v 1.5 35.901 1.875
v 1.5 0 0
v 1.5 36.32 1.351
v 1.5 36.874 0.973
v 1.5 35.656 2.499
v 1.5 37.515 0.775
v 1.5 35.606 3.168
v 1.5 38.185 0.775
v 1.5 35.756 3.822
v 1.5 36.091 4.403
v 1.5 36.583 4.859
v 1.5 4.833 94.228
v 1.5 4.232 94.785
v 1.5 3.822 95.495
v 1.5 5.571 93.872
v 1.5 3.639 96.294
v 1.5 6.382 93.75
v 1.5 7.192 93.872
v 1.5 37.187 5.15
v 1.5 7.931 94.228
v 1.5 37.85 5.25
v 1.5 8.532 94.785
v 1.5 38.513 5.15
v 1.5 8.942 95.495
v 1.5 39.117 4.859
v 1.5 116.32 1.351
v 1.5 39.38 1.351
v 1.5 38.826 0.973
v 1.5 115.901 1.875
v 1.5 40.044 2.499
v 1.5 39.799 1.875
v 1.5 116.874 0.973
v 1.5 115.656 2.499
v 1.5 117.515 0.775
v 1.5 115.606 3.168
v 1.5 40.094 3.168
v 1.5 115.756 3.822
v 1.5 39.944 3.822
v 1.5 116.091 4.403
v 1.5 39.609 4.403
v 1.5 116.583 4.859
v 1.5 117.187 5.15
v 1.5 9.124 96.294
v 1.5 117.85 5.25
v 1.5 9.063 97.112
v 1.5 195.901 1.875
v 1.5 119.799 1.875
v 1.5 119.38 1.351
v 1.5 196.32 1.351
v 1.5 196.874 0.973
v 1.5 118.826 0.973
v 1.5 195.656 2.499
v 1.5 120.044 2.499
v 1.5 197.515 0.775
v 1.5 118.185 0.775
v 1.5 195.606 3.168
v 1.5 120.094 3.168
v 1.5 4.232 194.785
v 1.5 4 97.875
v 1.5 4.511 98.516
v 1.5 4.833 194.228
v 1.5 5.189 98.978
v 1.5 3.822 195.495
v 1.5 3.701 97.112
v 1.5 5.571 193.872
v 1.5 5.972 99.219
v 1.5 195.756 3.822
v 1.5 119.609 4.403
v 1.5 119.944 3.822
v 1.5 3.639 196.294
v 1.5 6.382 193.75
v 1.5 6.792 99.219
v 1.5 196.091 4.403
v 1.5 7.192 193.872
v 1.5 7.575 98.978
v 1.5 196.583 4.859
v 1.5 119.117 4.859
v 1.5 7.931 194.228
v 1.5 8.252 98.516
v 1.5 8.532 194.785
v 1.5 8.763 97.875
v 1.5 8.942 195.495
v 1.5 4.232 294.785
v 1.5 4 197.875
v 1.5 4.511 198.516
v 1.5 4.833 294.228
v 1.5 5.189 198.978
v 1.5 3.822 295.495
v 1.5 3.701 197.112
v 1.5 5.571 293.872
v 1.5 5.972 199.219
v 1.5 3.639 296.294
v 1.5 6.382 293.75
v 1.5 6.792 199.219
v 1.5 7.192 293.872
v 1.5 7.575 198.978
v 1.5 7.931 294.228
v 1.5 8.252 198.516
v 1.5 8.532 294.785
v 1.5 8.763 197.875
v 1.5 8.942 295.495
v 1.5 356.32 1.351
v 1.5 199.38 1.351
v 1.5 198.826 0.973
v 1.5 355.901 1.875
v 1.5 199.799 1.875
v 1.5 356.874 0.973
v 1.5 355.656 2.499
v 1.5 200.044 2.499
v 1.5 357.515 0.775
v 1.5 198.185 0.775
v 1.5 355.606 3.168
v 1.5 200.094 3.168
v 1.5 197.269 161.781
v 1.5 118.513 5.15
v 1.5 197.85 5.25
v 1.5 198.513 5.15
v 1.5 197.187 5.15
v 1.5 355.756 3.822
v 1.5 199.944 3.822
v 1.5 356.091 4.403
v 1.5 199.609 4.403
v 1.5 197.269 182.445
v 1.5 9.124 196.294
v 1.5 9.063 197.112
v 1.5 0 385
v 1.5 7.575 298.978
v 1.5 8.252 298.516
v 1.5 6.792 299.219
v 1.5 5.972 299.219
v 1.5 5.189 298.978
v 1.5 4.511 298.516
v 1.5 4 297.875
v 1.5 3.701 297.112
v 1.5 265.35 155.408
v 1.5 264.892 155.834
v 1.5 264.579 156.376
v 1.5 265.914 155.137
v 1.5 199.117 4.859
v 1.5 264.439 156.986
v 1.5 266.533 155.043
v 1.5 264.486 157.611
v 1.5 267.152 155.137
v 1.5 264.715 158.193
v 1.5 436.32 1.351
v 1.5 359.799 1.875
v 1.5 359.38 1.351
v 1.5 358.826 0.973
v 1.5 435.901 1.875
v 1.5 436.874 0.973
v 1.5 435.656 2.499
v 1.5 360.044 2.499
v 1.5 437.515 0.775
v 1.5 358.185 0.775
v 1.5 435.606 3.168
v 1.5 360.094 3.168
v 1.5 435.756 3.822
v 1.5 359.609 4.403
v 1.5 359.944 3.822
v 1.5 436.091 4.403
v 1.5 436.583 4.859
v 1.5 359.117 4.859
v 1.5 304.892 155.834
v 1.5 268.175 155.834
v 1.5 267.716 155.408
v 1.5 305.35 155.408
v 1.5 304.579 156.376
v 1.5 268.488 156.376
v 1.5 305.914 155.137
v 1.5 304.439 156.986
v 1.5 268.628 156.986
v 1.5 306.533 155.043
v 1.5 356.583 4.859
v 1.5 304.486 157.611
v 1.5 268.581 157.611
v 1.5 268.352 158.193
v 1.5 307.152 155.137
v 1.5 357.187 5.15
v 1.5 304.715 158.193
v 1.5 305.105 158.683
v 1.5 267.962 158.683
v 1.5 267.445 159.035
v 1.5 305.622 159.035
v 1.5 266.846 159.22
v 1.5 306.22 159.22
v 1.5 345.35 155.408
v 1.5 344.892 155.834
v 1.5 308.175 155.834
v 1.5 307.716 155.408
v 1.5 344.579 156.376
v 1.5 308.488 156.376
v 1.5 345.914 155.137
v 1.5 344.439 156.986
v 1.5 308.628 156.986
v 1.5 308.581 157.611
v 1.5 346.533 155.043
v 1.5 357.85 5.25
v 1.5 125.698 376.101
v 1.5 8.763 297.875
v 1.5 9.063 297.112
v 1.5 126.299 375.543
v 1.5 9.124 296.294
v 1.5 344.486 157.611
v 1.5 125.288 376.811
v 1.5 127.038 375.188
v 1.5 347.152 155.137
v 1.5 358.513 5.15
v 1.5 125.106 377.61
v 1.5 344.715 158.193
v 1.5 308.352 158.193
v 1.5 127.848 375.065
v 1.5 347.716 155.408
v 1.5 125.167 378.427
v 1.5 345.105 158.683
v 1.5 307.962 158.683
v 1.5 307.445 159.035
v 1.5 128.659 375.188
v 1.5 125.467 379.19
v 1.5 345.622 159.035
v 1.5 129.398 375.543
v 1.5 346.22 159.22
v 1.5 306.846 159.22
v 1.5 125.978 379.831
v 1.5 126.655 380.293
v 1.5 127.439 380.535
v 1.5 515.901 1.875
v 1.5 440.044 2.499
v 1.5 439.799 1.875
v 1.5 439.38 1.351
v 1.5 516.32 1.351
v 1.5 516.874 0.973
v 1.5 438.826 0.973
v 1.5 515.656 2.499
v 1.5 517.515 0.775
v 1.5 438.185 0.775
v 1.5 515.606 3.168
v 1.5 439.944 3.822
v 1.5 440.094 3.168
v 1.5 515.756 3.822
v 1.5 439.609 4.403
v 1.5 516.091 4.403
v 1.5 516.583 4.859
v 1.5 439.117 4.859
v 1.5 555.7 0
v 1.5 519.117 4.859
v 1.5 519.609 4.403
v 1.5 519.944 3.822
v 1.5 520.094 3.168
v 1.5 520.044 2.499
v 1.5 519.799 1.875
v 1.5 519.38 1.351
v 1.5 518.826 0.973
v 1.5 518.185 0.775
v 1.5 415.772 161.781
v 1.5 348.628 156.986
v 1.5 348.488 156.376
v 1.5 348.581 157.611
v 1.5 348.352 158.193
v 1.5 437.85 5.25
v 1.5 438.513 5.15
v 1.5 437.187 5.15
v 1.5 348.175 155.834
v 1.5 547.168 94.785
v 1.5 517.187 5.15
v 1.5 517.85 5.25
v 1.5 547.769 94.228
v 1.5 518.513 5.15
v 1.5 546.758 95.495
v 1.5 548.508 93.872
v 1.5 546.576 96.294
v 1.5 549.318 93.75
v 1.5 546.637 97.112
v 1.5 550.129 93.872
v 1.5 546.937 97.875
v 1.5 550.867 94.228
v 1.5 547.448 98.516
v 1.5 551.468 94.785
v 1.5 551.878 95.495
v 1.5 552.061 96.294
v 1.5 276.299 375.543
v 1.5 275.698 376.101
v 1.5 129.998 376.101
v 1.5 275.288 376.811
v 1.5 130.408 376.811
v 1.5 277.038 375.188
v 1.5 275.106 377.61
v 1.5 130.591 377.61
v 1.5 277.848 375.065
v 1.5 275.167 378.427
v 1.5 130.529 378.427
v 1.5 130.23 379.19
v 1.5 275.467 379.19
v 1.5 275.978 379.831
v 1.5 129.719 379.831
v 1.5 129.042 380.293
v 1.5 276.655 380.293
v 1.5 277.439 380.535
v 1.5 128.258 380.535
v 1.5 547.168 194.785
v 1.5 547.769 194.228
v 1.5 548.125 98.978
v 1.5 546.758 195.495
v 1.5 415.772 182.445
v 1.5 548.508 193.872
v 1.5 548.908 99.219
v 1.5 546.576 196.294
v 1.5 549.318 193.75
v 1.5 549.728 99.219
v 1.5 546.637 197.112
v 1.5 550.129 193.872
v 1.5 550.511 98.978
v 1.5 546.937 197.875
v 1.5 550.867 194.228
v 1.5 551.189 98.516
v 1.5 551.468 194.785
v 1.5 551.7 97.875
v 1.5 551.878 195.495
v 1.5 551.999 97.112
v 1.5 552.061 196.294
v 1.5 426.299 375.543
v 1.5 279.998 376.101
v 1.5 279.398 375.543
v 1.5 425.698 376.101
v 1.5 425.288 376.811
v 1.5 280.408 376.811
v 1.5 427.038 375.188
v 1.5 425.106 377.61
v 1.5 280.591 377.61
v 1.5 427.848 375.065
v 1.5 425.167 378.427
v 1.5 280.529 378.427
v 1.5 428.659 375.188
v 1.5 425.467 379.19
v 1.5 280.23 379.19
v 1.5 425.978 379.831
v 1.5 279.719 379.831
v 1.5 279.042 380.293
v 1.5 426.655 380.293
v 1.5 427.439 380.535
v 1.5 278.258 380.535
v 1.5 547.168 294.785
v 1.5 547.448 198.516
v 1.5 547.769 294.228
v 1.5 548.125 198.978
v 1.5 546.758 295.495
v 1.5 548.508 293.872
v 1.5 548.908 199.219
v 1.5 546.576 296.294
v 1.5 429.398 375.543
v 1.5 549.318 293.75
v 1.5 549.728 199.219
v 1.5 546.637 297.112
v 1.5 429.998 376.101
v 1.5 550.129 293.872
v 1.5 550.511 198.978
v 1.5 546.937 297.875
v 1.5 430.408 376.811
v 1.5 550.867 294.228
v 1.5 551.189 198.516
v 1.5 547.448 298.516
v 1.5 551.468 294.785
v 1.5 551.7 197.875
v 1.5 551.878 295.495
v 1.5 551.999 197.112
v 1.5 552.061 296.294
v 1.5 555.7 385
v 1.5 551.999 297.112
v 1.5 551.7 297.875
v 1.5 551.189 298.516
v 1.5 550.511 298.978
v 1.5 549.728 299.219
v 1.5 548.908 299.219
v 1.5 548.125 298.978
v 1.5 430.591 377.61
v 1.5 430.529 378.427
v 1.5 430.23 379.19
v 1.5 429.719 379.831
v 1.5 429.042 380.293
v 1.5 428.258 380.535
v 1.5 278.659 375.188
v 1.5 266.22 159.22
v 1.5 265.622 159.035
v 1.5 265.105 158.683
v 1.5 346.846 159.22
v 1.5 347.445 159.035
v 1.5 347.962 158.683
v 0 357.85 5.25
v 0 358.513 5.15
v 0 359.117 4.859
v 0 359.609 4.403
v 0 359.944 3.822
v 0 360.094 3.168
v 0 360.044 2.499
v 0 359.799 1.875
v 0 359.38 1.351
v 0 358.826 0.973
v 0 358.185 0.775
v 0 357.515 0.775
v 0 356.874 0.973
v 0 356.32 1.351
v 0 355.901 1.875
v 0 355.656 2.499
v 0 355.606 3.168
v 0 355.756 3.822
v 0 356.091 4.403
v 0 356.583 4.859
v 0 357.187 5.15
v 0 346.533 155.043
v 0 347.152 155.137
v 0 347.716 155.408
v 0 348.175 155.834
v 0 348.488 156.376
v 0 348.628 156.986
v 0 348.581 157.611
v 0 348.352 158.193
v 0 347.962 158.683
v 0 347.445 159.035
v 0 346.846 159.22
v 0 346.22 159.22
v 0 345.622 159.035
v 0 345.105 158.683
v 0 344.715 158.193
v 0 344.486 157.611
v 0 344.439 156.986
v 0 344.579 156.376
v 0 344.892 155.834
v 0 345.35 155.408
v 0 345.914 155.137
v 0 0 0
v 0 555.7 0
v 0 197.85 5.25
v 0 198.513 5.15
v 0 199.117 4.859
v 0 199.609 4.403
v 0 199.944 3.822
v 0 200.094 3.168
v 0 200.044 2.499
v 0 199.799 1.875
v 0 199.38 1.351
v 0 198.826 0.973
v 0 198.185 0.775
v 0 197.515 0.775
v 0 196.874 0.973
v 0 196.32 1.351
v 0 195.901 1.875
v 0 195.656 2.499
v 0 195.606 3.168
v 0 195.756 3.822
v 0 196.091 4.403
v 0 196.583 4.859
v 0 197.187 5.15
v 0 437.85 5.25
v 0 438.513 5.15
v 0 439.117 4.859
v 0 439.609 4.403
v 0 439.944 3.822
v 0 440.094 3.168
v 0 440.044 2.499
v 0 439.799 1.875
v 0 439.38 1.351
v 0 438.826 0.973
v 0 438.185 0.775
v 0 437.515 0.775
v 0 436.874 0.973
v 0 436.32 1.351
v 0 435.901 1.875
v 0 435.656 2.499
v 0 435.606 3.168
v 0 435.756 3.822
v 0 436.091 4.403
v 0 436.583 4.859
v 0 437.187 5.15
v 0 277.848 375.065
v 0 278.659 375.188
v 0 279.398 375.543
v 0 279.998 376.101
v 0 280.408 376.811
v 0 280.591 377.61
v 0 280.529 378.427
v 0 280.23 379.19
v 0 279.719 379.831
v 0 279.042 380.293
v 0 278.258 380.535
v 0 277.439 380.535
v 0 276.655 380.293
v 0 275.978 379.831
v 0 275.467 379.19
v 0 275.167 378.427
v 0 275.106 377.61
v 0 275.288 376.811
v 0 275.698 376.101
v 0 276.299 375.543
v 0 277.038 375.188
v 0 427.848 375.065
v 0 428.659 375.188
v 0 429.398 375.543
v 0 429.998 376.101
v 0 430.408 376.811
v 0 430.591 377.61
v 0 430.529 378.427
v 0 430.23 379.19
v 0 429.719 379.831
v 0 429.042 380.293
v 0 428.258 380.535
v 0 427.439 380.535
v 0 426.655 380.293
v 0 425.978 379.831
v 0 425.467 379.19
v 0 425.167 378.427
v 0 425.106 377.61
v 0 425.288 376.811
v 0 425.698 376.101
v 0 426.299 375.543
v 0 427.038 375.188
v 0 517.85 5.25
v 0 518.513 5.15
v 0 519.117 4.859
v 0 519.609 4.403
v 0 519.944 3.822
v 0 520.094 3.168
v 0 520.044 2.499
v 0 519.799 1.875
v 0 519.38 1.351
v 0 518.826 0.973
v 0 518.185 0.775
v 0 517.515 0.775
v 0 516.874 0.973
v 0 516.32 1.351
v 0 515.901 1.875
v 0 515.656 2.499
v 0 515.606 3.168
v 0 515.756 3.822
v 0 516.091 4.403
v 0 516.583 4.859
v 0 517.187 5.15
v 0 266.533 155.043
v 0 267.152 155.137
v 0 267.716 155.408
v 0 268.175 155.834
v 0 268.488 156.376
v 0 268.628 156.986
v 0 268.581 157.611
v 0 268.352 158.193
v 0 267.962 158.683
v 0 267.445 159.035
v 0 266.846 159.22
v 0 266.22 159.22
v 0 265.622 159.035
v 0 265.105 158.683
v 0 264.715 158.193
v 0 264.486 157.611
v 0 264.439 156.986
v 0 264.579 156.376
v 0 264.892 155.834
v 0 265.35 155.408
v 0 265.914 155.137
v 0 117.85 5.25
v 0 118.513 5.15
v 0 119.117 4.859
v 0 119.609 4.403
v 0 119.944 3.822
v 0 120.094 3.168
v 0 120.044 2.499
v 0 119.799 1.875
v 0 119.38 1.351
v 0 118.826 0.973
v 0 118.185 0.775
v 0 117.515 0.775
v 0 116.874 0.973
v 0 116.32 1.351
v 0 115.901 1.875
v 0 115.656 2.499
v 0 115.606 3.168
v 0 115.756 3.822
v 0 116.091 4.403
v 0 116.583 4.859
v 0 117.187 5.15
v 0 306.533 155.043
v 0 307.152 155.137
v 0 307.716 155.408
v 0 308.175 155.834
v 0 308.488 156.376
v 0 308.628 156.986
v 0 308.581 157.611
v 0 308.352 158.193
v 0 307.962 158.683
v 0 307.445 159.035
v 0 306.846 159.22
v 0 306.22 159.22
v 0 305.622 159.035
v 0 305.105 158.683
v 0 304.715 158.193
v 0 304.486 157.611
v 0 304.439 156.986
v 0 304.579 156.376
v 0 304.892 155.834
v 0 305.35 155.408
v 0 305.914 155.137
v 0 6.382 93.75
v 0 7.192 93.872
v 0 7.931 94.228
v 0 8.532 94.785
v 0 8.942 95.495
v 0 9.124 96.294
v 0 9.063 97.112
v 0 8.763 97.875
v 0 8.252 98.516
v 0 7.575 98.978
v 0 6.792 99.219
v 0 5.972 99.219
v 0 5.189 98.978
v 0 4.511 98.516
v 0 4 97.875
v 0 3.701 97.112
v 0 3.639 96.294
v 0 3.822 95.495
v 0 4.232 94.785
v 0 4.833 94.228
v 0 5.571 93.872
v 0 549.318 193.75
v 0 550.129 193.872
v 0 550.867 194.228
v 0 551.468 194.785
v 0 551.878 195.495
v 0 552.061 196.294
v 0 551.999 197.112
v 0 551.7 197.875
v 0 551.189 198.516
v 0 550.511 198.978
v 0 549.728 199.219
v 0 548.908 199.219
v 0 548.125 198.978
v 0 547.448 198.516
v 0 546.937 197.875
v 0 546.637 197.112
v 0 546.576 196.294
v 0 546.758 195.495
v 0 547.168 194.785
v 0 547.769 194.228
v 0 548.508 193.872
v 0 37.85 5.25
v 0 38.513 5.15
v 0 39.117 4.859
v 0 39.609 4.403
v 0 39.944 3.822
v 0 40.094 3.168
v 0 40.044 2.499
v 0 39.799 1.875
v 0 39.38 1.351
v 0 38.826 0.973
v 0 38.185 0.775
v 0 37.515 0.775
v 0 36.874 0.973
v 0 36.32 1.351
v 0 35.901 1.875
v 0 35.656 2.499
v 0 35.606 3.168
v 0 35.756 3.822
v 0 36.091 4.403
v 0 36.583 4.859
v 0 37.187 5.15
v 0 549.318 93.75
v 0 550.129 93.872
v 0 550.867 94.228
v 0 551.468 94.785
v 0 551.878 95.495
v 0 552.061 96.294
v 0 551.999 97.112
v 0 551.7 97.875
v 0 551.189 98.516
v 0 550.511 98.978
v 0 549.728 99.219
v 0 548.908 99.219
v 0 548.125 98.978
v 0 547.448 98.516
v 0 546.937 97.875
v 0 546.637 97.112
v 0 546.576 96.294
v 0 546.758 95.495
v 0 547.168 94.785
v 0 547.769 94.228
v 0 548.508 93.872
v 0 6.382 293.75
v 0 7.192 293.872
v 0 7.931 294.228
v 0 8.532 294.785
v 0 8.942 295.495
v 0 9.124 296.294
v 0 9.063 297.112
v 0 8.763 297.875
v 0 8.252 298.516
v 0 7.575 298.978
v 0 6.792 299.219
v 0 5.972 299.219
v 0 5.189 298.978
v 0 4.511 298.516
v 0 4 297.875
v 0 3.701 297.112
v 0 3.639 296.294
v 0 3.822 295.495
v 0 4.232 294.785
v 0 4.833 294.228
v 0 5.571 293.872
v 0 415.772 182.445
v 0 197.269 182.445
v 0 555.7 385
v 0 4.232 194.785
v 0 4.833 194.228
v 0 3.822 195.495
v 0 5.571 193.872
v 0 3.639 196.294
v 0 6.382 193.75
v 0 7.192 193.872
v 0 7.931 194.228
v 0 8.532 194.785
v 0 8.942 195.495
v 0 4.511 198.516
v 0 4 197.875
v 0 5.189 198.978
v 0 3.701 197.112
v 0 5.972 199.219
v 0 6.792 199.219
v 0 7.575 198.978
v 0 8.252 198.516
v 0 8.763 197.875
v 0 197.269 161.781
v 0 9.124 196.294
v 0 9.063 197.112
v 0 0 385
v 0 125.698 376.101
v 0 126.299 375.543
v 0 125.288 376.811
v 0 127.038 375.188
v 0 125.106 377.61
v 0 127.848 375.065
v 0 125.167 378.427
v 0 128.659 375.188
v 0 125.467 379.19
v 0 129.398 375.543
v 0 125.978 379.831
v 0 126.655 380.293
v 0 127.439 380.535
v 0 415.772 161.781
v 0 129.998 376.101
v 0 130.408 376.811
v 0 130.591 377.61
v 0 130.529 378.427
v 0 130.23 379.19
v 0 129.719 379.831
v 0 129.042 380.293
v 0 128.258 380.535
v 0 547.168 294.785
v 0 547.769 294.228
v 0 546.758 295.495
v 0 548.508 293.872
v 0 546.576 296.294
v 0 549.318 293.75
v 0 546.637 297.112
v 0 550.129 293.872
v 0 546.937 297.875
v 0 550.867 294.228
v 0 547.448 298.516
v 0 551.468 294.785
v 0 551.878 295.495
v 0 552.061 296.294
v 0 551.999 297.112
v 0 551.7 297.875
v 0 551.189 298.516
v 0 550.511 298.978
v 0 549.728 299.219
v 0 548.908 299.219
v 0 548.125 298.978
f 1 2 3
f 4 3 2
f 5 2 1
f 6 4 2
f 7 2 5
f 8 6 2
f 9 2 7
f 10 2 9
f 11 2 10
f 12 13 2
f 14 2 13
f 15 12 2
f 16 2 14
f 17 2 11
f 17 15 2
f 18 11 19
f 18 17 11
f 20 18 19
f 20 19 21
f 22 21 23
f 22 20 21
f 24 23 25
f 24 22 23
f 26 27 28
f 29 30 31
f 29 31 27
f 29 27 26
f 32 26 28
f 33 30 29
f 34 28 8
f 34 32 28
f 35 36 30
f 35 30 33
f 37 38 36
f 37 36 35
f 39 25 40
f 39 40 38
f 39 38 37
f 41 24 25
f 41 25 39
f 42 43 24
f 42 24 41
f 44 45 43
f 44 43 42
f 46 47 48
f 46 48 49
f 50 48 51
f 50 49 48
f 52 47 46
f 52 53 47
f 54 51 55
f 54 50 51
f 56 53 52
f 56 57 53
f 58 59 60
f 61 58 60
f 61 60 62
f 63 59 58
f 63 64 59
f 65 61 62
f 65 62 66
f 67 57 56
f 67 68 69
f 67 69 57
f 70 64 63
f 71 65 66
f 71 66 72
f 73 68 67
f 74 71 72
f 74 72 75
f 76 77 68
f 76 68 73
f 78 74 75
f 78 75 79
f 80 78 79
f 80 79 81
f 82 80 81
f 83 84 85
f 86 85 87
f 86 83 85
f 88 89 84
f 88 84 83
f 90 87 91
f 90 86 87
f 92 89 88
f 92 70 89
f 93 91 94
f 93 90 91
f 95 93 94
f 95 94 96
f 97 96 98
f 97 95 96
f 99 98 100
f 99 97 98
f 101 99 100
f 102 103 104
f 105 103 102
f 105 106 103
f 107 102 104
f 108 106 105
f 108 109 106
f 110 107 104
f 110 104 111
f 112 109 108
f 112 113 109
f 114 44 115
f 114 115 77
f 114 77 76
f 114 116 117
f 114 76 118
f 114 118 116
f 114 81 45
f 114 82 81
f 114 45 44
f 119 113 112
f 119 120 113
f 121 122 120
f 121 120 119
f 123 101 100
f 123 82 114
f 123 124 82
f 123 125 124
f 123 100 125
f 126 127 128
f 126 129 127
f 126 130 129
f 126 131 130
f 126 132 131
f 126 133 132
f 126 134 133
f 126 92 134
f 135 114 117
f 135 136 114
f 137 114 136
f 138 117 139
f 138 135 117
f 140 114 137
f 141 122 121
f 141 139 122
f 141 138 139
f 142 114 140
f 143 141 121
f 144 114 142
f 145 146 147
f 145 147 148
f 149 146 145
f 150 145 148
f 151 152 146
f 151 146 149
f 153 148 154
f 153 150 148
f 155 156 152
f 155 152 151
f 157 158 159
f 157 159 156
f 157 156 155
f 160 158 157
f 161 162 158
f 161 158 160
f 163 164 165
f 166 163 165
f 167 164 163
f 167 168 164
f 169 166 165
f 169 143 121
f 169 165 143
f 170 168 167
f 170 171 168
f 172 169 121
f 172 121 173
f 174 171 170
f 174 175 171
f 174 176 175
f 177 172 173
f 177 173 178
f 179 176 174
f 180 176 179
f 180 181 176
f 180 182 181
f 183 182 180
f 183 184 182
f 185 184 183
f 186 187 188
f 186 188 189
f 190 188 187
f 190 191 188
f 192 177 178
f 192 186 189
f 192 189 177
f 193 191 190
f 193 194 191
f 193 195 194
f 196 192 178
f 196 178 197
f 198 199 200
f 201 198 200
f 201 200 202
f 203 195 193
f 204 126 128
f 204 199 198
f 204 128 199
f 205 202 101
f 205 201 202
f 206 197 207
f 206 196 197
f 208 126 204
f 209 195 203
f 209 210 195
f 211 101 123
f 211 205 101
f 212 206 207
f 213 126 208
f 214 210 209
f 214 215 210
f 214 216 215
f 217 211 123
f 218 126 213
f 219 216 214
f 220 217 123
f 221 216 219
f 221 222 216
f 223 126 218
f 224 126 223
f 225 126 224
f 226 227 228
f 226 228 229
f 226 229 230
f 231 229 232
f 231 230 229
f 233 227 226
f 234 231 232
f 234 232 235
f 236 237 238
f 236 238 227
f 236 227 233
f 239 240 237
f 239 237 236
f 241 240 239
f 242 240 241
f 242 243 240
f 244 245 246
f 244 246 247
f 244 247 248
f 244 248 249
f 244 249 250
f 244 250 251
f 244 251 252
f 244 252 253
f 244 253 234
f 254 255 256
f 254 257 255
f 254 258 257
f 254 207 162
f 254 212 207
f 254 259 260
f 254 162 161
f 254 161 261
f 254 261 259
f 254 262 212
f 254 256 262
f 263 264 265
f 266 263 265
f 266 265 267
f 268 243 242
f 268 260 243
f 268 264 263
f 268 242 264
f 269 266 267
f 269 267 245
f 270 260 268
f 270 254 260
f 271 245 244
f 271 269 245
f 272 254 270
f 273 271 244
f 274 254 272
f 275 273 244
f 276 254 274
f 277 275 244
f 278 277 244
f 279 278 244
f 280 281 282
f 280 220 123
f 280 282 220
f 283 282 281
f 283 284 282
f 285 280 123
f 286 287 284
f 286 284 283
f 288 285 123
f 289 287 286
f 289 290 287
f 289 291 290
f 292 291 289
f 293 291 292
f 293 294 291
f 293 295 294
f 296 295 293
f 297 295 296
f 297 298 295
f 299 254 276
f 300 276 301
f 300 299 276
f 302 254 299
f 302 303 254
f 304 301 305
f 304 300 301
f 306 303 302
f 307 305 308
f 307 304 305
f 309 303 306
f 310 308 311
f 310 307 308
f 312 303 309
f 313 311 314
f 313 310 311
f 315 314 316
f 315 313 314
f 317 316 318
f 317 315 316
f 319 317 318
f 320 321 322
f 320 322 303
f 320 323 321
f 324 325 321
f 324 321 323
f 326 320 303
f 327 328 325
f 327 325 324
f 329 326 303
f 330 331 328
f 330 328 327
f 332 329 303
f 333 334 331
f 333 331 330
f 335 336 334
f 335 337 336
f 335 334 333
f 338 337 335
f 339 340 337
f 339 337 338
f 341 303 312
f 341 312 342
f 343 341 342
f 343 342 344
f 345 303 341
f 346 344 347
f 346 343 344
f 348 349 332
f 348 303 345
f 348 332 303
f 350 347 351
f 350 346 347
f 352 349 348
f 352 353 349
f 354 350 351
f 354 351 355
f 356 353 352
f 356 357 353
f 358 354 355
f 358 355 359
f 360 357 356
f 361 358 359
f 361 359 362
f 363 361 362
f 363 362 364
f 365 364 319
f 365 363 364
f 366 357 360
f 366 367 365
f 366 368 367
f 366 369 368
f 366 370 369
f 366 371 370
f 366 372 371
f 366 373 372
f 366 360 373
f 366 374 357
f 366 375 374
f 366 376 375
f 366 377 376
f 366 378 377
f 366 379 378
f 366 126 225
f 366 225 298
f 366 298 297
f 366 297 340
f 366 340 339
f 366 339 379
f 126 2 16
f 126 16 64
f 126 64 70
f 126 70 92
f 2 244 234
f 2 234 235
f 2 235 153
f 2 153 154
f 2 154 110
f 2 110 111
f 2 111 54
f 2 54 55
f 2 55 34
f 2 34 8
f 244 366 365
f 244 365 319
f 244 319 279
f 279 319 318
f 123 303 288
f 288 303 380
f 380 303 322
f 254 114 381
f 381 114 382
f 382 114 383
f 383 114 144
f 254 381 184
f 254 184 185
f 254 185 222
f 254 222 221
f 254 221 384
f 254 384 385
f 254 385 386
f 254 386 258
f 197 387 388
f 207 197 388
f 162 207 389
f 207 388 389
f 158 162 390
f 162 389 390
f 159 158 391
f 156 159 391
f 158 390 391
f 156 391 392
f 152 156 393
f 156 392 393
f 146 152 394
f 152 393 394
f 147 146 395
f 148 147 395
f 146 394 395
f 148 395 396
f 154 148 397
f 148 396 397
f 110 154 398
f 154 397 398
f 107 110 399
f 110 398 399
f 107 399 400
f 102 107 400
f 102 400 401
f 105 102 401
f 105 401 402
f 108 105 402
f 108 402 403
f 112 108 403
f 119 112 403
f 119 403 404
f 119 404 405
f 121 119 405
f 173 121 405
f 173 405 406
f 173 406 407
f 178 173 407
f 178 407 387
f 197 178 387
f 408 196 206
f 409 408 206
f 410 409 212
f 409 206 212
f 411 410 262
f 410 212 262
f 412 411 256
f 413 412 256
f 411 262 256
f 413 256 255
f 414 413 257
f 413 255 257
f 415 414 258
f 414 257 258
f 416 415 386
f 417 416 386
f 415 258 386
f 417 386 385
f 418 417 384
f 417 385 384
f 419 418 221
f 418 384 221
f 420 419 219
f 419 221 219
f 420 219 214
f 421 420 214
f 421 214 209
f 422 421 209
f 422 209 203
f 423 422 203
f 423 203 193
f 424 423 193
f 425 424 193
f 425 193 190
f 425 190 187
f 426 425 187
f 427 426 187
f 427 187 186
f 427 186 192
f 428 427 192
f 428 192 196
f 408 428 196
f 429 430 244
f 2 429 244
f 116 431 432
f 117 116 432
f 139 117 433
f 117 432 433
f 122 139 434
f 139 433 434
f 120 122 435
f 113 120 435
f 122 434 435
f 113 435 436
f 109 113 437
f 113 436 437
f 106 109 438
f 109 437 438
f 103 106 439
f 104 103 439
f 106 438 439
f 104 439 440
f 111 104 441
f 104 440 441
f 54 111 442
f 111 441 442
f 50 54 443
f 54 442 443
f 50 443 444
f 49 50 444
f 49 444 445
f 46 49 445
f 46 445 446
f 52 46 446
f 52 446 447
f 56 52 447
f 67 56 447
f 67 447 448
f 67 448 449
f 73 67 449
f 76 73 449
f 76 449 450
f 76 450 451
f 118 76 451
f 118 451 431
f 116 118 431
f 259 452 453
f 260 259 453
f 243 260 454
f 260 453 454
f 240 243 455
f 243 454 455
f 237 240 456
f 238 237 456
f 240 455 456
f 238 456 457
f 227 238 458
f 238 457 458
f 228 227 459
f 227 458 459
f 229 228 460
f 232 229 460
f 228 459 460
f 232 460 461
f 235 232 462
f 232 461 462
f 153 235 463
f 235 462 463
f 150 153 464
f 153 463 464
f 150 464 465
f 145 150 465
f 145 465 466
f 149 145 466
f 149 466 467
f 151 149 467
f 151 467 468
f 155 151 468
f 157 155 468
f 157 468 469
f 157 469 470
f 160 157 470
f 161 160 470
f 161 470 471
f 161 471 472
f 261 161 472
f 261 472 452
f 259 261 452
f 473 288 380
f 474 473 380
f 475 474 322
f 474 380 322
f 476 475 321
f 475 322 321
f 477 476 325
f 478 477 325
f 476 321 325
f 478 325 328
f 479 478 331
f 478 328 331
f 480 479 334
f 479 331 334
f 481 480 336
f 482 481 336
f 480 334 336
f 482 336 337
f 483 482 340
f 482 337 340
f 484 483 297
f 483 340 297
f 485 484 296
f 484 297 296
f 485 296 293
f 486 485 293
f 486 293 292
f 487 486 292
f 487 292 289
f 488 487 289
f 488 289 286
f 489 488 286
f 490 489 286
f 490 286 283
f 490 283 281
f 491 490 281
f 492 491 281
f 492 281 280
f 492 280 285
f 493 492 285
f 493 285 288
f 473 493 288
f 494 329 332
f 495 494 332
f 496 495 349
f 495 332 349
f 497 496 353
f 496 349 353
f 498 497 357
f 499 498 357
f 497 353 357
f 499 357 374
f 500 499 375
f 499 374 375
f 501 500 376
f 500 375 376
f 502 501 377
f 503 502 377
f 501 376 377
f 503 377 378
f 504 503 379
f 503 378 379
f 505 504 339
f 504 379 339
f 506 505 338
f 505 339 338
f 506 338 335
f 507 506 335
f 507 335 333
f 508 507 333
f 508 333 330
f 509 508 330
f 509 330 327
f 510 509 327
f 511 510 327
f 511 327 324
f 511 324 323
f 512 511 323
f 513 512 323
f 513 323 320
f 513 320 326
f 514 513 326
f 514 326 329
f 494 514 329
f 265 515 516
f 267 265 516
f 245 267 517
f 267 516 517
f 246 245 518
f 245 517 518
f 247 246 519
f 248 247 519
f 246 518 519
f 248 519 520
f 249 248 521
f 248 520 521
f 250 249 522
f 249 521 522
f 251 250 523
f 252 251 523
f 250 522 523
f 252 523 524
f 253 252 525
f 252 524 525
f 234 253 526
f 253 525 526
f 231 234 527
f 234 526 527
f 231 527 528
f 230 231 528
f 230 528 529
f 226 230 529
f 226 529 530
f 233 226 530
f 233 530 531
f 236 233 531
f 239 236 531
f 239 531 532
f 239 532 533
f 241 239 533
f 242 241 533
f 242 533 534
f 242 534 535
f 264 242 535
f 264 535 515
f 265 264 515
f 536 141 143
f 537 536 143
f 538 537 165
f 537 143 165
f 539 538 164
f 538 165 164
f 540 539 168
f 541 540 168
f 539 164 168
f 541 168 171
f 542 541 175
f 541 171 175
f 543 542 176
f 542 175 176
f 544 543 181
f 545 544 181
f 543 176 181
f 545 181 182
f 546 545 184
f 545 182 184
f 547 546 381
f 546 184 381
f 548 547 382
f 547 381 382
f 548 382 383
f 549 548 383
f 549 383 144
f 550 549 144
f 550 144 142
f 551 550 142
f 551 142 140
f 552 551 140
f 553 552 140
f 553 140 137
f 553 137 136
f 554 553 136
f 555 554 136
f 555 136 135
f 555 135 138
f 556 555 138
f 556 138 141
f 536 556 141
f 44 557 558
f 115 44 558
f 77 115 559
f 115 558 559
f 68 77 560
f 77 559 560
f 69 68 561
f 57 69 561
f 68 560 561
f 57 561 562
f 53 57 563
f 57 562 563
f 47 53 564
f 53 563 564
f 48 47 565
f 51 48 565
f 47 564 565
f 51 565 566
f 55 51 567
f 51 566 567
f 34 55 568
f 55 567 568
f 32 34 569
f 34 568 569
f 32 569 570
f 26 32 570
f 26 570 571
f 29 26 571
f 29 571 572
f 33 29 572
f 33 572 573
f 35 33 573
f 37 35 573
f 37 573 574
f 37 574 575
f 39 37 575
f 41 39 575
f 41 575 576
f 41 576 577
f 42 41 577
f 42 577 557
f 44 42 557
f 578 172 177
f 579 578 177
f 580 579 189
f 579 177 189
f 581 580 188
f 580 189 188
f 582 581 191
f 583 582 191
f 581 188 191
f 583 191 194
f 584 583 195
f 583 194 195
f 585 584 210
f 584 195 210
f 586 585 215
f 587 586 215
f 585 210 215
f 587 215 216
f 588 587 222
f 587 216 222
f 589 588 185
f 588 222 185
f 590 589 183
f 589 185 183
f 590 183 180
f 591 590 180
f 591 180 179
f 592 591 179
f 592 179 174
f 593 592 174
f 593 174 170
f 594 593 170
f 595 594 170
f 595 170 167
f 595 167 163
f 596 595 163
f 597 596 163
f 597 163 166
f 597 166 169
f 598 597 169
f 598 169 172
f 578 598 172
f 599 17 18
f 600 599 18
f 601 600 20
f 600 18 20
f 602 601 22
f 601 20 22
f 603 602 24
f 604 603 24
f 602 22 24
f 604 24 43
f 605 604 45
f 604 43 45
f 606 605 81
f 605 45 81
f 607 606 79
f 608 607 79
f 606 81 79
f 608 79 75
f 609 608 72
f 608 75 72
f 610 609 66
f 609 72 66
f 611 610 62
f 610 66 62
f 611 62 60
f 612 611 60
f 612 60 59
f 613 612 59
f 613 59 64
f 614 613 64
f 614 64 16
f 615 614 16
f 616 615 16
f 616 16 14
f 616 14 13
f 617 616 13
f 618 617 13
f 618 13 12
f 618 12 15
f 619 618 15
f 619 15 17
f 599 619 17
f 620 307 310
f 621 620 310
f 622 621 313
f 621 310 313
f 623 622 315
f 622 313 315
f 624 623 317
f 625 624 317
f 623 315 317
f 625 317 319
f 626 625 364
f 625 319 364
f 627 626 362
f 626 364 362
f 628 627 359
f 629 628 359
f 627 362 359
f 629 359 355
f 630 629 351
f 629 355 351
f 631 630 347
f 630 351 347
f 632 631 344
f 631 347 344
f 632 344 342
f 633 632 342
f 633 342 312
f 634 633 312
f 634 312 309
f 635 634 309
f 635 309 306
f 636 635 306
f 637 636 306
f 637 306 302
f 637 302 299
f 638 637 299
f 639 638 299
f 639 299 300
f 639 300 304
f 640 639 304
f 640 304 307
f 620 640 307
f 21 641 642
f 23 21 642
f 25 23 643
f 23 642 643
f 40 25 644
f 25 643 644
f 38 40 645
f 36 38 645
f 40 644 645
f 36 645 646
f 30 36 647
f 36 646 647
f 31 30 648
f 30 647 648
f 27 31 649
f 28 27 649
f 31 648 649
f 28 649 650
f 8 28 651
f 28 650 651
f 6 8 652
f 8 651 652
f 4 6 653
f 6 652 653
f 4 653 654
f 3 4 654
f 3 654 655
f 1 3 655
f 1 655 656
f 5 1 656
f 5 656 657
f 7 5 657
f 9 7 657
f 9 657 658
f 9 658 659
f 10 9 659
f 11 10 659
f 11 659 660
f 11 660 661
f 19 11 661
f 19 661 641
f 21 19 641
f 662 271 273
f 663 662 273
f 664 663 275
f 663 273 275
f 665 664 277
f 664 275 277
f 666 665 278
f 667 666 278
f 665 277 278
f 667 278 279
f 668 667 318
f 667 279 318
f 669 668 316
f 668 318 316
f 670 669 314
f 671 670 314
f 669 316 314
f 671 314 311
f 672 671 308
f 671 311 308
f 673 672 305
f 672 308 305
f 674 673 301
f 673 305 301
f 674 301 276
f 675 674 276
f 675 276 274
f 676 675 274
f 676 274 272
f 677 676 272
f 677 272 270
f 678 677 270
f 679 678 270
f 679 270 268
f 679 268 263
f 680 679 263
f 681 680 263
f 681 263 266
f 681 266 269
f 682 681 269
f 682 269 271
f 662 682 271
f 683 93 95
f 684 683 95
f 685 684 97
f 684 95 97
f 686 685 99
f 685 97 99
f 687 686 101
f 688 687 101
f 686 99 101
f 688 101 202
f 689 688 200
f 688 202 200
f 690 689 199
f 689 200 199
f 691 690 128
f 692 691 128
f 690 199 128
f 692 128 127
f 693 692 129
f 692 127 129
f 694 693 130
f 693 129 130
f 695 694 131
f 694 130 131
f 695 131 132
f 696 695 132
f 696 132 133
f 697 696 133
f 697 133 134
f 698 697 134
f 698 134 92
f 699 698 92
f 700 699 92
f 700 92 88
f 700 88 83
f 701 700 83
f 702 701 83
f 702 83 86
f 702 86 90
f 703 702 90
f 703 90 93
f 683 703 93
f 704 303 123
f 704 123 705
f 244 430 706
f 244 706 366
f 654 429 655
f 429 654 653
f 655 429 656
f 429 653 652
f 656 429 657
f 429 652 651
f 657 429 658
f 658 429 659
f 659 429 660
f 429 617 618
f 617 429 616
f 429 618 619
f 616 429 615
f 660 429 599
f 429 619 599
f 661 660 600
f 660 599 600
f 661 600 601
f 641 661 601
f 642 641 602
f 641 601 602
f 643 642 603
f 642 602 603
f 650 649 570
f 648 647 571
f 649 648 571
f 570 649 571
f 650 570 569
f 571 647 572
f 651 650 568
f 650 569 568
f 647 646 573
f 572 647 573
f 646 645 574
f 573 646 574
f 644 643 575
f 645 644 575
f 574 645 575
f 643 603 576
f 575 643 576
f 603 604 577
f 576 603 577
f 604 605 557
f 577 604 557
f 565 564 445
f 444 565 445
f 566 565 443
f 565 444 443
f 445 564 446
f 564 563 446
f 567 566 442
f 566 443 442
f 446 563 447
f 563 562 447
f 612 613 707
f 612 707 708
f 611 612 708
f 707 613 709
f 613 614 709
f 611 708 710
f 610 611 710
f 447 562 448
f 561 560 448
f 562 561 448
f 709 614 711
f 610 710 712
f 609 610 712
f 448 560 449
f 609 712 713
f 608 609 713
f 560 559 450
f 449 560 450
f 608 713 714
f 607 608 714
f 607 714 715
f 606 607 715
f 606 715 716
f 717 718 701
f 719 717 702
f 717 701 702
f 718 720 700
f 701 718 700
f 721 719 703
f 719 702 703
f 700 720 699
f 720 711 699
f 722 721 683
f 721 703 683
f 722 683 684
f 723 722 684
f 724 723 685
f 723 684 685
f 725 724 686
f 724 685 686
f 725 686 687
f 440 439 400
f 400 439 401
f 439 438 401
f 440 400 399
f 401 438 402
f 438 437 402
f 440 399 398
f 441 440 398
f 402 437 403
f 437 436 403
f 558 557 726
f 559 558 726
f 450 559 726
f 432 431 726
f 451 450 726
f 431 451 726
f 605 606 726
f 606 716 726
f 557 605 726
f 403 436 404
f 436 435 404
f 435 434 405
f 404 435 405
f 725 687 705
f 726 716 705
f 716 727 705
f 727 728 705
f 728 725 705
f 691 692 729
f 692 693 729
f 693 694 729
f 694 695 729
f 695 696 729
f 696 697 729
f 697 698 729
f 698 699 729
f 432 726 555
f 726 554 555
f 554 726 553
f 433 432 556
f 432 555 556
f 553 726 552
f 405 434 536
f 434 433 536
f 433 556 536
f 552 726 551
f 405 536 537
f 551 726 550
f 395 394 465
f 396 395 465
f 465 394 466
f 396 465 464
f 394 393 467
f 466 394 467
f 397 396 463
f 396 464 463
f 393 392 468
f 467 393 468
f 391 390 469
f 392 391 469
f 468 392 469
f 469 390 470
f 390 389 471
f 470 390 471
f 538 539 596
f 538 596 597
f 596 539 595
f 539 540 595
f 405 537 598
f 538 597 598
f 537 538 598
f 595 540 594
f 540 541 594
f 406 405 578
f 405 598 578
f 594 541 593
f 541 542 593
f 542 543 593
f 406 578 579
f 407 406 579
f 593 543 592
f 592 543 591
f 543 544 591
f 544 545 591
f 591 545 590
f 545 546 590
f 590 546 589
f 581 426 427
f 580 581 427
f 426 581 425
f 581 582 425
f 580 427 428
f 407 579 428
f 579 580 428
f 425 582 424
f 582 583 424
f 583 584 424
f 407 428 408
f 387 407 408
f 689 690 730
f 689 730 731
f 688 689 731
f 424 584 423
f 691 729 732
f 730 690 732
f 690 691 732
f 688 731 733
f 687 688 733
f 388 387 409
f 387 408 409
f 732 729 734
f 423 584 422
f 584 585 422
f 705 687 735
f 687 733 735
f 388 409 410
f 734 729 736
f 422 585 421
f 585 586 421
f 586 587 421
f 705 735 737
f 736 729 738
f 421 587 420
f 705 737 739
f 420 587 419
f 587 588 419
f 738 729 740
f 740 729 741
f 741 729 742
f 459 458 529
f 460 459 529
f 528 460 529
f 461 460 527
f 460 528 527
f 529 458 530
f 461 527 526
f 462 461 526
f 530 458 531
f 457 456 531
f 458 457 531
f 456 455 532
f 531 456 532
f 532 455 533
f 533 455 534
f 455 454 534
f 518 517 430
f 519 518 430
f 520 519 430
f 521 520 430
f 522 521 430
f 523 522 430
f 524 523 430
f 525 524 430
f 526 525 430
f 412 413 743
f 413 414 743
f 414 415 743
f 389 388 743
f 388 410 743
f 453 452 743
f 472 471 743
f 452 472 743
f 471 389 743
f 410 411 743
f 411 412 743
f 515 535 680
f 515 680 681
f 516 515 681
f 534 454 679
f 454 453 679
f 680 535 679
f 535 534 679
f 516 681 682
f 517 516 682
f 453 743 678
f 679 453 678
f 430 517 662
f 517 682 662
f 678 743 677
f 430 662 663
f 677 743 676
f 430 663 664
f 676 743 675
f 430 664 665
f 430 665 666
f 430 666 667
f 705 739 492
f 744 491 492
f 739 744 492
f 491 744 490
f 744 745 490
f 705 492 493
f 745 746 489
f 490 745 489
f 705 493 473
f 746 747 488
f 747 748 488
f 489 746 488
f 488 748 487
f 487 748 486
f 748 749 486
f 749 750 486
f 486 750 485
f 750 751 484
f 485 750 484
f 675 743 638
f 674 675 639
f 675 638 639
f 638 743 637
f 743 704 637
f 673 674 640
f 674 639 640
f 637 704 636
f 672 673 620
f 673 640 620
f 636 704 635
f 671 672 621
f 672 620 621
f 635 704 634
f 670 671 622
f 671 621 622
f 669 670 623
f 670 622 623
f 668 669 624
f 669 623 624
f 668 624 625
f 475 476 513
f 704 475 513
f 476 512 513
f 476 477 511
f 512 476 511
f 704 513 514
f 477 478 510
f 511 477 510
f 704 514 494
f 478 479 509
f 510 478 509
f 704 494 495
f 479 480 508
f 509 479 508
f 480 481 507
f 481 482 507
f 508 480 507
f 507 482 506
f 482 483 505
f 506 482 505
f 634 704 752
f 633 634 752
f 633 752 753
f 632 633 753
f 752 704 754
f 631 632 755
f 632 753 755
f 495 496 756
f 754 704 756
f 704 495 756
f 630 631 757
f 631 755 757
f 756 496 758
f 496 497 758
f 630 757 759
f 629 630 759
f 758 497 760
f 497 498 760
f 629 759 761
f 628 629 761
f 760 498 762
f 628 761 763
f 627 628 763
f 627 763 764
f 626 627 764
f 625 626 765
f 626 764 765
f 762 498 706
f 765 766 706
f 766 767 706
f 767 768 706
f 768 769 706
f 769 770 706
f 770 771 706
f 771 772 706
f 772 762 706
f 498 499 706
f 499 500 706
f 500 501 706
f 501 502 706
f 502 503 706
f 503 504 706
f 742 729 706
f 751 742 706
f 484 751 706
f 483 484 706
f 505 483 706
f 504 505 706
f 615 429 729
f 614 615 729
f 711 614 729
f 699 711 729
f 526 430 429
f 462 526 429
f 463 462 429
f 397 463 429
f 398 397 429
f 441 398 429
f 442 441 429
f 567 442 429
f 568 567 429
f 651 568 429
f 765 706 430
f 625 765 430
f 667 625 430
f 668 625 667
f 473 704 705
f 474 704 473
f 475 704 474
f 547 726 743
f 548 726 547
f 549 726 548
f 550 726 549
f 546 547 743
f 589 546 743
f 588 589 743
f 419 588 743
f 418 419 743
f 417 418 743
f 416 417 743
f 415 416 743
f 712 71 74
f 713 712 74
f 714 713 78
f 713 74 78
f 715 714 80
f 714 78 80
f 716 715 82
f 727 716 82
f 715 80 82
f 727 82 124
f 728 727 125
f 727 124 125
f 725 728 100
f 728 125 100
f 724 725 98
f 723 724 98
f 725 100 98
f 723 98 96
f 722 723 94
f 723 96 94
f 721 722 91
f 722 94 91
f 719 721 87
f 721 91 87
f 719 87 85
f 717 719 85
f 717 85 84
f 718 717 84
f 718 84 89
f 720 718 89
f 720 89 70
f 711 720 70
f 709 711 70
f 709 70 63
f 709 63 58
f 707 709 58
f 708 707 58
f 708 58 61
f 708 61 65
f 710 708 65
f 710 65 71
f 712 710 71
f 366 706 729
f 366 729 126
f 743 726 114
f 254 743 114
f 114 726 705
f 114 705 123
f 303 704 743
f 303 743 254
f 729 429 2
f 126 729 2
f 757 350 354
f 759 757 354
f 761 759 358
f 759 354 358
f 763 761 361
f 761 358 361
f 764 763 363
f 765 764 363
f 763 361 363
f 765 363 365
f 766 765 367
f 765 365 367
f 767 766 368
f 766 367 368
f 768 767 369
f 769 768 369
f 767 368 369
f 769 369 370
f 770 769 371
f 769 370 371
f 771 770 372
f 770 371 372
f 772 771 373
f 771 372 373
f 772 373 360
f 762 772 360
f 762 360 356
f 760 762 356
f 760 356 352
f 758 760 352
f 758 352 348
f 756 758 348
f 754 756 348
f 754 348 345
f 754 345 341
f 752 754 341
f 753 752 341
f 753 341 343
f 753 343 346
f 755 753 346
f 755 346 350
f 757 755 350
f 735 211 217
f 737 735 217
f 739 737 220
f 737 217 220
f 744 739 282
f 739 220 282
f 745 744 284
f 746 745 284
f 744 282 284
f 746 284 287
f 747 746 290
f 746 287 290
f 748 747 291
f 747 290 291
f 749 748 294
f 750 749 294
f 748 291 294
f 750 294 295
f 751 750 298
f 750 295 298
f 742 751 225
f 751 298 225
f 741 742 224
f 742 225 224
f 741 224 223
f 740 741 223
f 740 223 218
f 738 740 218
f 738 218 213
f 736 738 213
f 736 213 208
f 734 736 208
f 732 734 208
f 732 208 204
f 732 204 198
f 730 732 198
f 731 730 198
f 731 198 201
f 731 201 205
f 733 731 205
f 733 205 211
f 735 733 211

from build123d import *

# Parameters (mm, degrees)
SKETCH_1_W             = 1.5
SKETCH_1_H             = 555.7
SM_BASE_FLANGE_1_DEPTH = 385
SKETCH_6_W             = 88.363212941
SKETCH_6_H             = 264.50252719
CUT_EXTRUDE_1_DEPTH    = 74.5
SKETCH_7_W             = 1.5
SKETCH_7_H             = 264.50252719
EXTRUDE_1_DEPTH        = 47.7
SKETCH_8_W             = 1.5
SKETCH_8_H             = 40.663212941
EXTRUDE_2_DEPTH        = 20
SKETCH_9_W             = 1.5
SKETCH_9_H             = 40.663212941
EXTRUDE_3_DEPTH        = 26
SKETCH_10_W            = 1.5
SKETCH_10_H            = 218.50252719
EXTRUDE_4_DEPTH        = 20
SKETCH_12_R            = 2.75
CUT_EXTRUDE_2_DEPTH    = 20
SKETCH_13_R            = 2.75
CUT_EXTRUDE_3_DEPTH    = 10
SKETCH_14_R            = 2.75
CUT_EXTRUDE_4_DEPTH    = 10
SKETCH_15_R            = 2.25
CUT_EXTRUDE_5_DEPTH    = 10
SKETCH_17_R            = 2.1
CUT_EXTRUDE_6_DEPTH    = 20


# Sheet-metal steps are written as plain solids
with BuildPart() as part:
    # Sketch 1 → 基体-法兰1 (new body)
    with BuildSketch(Plane.XY):
        with Locations((0.75, 277.85)):
            Rectangle(SKETCH_1_W, SKETCH_1_H)
    extrude(amount=SM_BASE_FLANGE_1_DEPTH)

    # 草图6 → 切除-拉伸1 (cut)
    with BuildSketch(Plane.ZY):
        with Locations((158.262985354, 303.520646834)):
            Rectangle(SKETCH_6_W, SKETCH_6_H)
    extrude(amount=-CUT_EXTRUDE_1_DEPTH, mode=Mode.SUBTRACT)

    # 草图7 → 凸台-拉伸1 (add)
    with BuildSketch(Plane.XY.offset(114.081378883)):
        with Locations((0.75, 303.520646834)):
            Rectangle(SKETCH_7_W, SKETCH_7_H)
    extrude(amount=EXTRUDE_1_DEPTH)

    # 草图8 → 凸台-拉伸2 (add)
    with BuildSketch(Plane.XZ.offset(-435.771910429)):
        with Locations((0.75, 182.112985353)):
            Rectangle(SKETCH_8_W, SKETCH_8_H)
    extrude(amount=EXTRUDE_2_DEPTH)

    # 草图9 → 凸台-拉伸3 (add)
    with BuildSketch(Plane(origin=(0, 171.269383239, 0), x_dir=(1, 0, 0), z_dir=(0, 1, 0))):
        with Locations((0.75, -182.112985353)):
            Rectangle(SKETCH_9_W, SKETCH_9_H)
    extrude(amount=EXTRUDE_3_DEPTH)

    # 草图10 → 凸台-拉伸4 (add)
    with BuildSketch(Plane(origin=(0, 0, 202.444591824), x_dir=(-1, 0, 0), z_dir=(0, 0, -1))):
        with Locations((-0.75, 306.520646834)):
            Rectangle(SKETCH_10_W, SKETCH_10_H)
    extrude(amount=EXTRUDE_4_DEPTH)

    # 草图12 → 切除-拉伸2 (cut)
    with BuildSketch(Plane(origin=(1.5, 0, 0), x_dir=(0, 0, -1), z_dir=(1, 0, 0))):
        with Locations((-296.5, 6.3817)):
            Circle(SKETCH_12_R)
        with Locations((-196.5, 6.3817)):
            Circle(SKETCH_12_R)
        with Locations((-96.5, 6.3817)):
            Circle(SKETCH_12_R)
    extrude(amount=-CUT_EXTRUDE_2_DEPTH, mode=Mode.SUBTRACT)

    # 草图13 → 切除-拉伸3 (cut)
    with BuildSketch(Plane(origin=(1.5, 0, 0), x_dir=(0, 0, -1), z_dir=(1, 0, 0))):
        with Locations((-377.815462169, 127.8484)):
            Circle(SKETCH_13_R)
        with Locations((-377.815462169, 277.8484)):
            Circle(SKETCH_13_R)
        with Locations((-377.815462169, 427.8484)):
            Circle(SKETCH_13_R)
    extrude(amount=-CUT_EXTRUDE_3_DEPTH, mode=Mode.SUBTRACT)

    # 草图14 → 切除-拉伸4 (cut)
    with BuildSketch(Plane(origin=(1.5, 0, 0), x_dir=(0, 0, -1), z_dir=(1, 0, 0))):
        with Locations((-296.5, 549.3183)):
            Circle(SKETCH_14_R)
        with Locations((-196.5, 549.3183)):
            Circle(SKETCH_14_R)
        with Locations((-96.5, 549.3183)):
            Circle(SKETCH_14_R)
    extrude(amount=-CUT_EXTRUDE_4_DEPTH, mode=Mode.SUBTRACT)

    # 草图15 → 切除-拉伸5 (cut)
    with BuildSketch(Plane.ZY):
        with Locations((3, 517.85)):
            Circle(SKETCH_15_R)
        with Locations((3, 437.85)):
            Circle(SKETCH_15_R)
        with Locations((3, 357.85)):
            Circle(SKETCH_15_R)
        with Locations((3, 37.85)):
            Circle(SKETCH_15_R)
        with Locations((3, 117.85)):
            Circle(SKETCH_15_R)
        with Locations((3, 197.85)):
            Circle(SKETCH_15_R)
    extrude(amount=-CUT_EXTRUDE_5_DEPTH, mode=Mode.SUBTRACT)

    # 草图17 → 切除-拉伸6 (cut)
    with BuildSketch(Plane(origin=(1.5, 0, 0), x_dir=(0, 0, -1), z_dir=(1, 0, 0))):
        with Locations((-157.14323819, 266.5334)):
            Circle(SKETCH_17_R)
        with Locations((-157.14323819, 306.5334)):
            Circle(SKETCH_17_R)
        with Locations((-157.14323819, 346.5334)):
            Circle(SKETCH_17_R)
    extrude(amount=-CUT_EXTRUDE_6_DEPTH, mode=Mode.SUBTRACT)


solid = part.part
